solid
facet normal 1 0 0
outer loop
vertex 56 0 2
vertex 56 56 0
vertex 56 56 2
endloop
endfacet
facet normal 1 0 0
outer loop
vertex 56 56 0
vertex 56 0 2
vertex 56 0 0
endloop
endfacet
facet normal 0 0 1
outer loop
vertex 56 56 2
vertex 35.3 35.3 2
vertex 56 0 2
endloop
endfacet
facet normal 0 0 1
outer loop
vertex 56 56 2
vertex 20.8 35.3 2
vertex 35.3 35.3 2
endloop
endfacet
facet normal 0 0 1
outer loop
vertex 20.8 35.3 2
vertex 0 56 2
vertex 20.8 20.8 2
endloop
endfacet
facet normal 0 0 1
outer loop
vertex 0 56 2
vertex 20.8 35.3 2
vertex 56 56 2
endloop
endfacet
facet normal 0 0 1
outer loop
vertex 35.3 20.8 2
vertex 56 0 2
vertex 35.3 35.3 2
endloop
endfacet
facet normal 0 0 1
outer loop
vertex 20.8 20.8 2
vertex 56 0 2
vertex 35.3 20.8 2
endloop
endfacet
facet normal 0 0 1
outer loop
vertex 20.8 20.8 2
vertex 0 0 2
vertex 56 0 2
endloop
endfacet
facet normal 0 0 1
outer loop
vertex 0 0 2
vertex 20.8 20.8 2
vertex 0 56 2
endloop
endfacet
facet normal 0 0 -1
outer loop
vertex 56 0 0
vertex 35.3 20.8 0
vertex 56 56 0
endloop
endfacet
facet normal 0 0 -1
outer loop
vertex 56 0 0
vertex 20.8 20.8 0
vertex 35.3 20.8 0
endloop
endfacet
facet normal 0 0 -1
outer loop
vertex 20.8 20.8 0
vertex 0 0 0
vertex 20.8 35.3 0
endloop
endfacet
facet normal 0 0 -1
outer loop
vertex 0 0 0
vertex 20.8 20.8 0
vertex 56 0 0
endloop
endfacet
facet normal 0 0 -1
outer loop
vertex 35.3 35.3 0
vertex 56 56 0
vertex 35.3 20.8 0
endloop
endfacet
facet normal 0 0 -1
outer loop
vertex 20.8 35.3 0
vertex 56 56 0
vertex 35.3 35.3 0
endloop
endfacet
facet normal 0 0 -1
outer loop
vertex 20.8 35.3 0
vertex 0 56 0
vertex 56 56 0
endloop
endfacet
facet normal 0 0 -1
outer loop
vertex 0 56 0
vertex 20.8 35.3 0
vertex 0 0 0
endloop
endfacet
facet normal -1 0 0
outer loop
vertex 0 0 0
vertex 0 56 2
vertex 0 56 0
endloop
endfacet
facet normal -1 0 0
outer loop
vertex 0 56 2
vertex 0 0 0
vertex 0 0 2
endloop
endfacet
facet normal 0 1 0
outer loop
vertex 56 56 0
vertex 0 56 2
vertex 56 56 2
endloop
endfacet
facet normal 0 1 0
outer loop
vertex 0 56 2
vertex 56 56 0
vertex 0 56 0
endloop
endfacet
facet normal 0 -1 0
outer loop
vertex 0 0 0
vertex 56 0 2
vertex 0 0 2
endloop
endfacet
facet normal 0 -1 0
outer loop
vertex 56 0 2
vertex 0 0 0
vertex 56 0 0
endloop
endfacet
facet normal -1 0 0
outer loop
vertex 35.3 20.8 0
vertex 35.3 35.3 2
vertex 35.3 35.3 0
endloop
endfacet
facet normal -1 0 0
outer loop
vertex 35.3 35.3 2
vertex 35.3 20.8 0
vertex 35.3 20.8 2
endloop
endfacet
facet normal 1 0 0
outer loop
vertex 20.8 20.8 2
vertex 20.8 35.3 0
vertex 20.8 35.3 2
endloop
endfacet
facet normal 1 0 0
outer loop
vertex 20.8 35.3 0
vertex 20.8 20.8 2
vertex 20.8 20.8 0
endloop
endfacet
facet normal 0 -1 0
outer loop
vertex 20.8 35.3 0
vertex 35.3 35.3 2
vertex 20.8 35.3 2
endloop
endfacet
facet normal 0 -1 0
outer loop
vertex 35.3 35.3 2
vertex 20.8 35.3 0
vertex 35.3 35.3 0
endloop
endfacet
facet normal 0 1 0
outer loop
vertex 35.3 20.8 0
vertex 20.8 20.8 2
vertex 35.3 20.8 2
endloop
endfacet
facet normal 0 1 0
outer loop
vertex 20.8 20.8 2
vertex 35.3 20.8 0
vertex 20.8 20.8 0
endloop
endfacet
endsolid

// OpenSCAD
difference() //lid for the box
{
  translate([0,0,0]) cube([56,56,2]); 
  translate([20.8,20.8,-1]) cube([14.5,14.5,6]);
}
